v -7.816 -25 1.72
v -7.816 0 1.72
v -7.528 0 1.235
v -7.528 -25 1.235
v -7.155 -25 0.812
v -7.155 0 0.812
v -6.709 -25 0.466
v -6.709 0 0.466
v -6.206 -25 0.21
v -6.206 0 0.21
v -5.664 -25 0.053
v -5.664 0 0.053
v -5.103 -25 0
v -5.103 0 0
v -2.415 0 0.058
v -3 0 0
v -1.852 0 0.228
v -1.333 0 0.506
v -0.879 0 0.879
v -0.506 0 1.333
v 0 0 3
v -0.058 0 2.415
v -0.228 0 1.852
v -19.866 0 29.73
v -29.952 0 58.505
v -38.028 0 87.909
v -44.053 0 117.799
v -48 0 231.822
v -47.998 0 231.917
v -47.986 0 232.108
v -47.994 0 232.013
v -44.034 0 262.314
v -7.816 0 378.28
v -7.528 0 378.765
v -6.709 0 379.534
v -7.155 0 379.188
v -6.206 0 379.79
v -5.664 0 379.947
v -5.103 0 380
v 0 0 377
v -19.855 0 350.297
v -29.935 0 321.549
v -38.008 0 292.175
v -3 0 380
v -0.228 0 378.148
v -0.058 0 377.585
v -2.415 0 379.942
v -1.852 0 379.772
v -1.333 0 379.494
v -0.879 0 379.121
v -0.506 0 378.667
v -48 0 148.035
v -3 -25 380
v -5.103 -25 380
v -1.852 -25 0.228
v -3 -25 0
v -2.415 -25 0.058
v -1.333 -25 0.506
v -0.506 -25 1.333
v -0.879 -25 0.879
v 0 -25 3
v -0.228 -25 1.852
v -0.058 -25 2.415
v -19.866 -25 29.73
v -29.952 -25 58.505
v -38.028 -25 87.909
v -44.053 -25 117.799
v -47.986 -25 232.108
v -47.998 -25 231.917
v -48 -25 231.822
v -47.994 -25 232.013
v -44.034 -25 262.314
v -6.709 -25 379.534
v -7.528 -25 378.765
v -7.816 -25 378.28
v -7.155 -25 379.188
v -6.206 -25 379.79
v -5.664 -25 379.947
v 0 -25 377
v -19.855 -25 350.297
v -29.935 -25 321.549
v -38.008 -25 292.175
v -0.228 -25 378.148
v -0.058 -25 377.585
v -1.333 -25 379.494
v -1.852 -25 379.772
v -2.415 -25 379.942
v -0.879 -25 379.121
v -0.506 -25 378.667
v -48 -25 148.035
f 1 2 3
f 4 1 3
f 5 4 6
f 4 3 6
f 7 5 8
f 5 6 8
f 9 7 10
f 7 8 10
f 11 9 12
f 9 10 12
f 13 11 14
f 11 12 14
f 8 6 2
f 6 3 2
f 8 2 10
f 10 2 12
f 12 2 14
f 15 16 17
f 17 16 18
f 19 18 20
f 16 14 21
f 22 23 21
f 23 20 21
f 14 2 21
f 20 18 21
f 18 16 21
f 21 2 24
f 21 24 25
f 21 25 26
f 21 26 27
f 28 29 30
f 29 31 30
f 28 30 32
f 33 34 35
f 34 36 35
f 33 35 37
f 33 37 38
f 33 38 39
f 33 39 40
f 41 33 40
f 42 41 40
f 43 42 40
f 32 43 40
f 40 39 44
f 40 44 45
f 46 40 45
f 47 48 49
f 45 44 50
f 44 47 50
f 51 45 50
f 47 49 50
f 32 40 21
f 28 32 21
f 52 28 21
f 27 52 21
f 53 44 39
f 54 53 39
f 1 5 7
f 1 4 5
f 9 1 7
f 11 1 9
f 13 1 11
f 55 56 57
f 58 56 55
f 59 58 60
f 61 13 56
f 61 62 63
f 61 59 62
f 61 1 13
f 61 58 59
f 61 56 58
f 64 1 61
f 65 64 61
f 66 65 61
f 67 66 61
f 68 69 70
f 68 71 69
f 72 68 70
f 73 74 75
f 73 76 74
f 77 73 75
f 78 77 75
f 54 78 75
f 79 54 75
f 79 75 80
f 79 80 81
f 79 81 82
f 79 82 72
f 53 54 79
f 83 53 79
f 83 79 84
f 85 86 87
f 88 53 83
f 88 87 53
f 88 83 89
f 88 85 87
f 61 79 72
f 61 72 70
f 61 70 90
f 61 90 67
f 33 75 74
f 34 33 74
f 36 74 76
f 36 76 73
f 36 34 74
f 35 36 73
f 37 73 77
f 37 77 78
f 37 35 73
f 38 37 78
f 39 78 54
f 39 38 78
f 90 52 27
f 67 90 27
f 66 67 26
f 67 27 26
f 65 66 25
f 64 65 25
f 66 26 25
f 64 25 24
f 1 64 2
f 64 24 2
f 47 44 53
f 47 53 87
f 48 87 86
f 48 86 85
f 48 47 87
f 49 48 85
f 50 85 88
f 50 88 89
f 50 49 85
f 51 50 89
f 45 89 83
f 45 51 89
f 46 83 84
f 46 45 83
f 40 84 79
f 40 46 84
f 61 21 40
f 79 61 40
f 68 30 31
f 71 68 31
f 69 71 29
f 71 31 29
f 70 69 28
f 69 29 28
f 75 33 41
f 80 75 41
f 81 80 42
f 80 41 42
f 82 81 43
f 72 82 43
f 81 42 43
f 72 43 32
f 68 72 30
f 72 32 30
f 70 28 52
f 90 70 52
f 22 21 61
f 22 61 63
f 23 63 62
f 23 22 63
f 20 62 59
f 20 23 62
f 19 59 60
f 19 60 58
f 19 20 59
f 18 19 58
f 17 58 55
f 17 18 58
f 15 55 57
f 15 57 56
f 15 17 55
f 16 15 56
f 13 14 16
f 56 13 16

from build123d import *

# Parameters (mm, degrees)
F1_DEPTH    = 25
F2_T1_DEPTH = 34.5185252635
F2_T3_DEPTH = 40
F2_T5_DEPTH = 25.7185484132


# Not quite as in the source:
# - a fillet or chamfer that OpenCascade refuses, or shapes differently, is made with other operations: its cross-section is extruded or revolved along the edge and cut away or added


with BuildPart() as f1:
    # F0 (on Front) → F1 (new body)
    with BuildSketch(Plane.XZ):
        with BuildLine():
            Line((-7, 0), (0, 0))
            Line((0, 0), (0, 380))
            Line((0, 380), (-7, 380))
            ThreePointArc((-7, 380), (-33.9910126529, 307.7803129177), (-48, 231.9651017804))
            Line((-48, 231.9651017804), (-48, 190))
            Line((-48, 190), (-48, 148.0348982196))
            ThreePointArc((-48, 148.0348982196), (-33.9910126529, 72.2196870823), (-7, 0))
        make_face()
    extrude(amount=F1_DEPTH)

    # F2: fillet of radius 3 on 5 edges, made by hand

    # F2_s2 → F2_t1 (cut)
    with BuildSketch(Plane.XZ.offset(-4.7592626318)):
        with BuildLine():
            ThreePointArc((-7.8159850821, 378.2800403279), (-6.7089962565, 379.533783829), (-5.1027772465, 380))
            Line((-5.1027772465, 380), (-7, 380))
            ThreePointArc((-7, 380), (-7.408920068, 379.1404602023), (-7.8159850821, 378.2800403279))
        make_face()
        with BuildLine():
            ThreePointArc((-7.8159850821, 1.7199596721), (-6.7089962565, 0.466216171), (-5.1027772465, 0))
            Line((-5.1027772465, 0), (-7, 0))
            ThreePointArc((-7, 0), (-7.408920068, 0.8595397977), (-7.8159850821, 1.7199596721))
        make_face()
    extrude(amount=F2_T1_DEPTH, mode=Mode.SUBTRACT)

    # F2_s4 → F2_t3 (cut)
    with BuildSketch(Plane.XZ.offset(-7.5)):
        with BuildLine():
            ThreePointArc((-3, 380), (-0.8786796564, 379.1213203436), (0, 377))
            Line((0, 377), (0, 380))
            Line((0, 380), (-3, 380))
        make_face()
        with BuildLine():
            ThreePointArc((0, 3), (-0.8786796564, 0.8786796564), (-3, 0))
            Line((-3, 0), (0, 0))
            Line((0, 0), (0, 3))
        make_face()
    extrude(amount=F2_T3_DEPTH, mode=Mode.SUBTRACT)

    # F2_s6 → F2_t5 (cut)
    with BuildSketch(Plane.XZ.offset(-0.3592742066)):
        with BuildLine():
            ThreePointArc((-47.9863097291, 232.1081578861), (-47.9965754777, 231.9651832447), (-48, 231.8218814431))
            Line((-48, 231.8218814431), (-48, 231.9651017804))
            ThreePointArc((-48, 231.9651017804), (-47.9931606883, 232.0366303906), (-47.9863097291, 232.1081578861))
        make_face()
    extrude(amount=F2_T5_DEPTH, mode=Mode.SUBTRACT)


solid = f1.part
